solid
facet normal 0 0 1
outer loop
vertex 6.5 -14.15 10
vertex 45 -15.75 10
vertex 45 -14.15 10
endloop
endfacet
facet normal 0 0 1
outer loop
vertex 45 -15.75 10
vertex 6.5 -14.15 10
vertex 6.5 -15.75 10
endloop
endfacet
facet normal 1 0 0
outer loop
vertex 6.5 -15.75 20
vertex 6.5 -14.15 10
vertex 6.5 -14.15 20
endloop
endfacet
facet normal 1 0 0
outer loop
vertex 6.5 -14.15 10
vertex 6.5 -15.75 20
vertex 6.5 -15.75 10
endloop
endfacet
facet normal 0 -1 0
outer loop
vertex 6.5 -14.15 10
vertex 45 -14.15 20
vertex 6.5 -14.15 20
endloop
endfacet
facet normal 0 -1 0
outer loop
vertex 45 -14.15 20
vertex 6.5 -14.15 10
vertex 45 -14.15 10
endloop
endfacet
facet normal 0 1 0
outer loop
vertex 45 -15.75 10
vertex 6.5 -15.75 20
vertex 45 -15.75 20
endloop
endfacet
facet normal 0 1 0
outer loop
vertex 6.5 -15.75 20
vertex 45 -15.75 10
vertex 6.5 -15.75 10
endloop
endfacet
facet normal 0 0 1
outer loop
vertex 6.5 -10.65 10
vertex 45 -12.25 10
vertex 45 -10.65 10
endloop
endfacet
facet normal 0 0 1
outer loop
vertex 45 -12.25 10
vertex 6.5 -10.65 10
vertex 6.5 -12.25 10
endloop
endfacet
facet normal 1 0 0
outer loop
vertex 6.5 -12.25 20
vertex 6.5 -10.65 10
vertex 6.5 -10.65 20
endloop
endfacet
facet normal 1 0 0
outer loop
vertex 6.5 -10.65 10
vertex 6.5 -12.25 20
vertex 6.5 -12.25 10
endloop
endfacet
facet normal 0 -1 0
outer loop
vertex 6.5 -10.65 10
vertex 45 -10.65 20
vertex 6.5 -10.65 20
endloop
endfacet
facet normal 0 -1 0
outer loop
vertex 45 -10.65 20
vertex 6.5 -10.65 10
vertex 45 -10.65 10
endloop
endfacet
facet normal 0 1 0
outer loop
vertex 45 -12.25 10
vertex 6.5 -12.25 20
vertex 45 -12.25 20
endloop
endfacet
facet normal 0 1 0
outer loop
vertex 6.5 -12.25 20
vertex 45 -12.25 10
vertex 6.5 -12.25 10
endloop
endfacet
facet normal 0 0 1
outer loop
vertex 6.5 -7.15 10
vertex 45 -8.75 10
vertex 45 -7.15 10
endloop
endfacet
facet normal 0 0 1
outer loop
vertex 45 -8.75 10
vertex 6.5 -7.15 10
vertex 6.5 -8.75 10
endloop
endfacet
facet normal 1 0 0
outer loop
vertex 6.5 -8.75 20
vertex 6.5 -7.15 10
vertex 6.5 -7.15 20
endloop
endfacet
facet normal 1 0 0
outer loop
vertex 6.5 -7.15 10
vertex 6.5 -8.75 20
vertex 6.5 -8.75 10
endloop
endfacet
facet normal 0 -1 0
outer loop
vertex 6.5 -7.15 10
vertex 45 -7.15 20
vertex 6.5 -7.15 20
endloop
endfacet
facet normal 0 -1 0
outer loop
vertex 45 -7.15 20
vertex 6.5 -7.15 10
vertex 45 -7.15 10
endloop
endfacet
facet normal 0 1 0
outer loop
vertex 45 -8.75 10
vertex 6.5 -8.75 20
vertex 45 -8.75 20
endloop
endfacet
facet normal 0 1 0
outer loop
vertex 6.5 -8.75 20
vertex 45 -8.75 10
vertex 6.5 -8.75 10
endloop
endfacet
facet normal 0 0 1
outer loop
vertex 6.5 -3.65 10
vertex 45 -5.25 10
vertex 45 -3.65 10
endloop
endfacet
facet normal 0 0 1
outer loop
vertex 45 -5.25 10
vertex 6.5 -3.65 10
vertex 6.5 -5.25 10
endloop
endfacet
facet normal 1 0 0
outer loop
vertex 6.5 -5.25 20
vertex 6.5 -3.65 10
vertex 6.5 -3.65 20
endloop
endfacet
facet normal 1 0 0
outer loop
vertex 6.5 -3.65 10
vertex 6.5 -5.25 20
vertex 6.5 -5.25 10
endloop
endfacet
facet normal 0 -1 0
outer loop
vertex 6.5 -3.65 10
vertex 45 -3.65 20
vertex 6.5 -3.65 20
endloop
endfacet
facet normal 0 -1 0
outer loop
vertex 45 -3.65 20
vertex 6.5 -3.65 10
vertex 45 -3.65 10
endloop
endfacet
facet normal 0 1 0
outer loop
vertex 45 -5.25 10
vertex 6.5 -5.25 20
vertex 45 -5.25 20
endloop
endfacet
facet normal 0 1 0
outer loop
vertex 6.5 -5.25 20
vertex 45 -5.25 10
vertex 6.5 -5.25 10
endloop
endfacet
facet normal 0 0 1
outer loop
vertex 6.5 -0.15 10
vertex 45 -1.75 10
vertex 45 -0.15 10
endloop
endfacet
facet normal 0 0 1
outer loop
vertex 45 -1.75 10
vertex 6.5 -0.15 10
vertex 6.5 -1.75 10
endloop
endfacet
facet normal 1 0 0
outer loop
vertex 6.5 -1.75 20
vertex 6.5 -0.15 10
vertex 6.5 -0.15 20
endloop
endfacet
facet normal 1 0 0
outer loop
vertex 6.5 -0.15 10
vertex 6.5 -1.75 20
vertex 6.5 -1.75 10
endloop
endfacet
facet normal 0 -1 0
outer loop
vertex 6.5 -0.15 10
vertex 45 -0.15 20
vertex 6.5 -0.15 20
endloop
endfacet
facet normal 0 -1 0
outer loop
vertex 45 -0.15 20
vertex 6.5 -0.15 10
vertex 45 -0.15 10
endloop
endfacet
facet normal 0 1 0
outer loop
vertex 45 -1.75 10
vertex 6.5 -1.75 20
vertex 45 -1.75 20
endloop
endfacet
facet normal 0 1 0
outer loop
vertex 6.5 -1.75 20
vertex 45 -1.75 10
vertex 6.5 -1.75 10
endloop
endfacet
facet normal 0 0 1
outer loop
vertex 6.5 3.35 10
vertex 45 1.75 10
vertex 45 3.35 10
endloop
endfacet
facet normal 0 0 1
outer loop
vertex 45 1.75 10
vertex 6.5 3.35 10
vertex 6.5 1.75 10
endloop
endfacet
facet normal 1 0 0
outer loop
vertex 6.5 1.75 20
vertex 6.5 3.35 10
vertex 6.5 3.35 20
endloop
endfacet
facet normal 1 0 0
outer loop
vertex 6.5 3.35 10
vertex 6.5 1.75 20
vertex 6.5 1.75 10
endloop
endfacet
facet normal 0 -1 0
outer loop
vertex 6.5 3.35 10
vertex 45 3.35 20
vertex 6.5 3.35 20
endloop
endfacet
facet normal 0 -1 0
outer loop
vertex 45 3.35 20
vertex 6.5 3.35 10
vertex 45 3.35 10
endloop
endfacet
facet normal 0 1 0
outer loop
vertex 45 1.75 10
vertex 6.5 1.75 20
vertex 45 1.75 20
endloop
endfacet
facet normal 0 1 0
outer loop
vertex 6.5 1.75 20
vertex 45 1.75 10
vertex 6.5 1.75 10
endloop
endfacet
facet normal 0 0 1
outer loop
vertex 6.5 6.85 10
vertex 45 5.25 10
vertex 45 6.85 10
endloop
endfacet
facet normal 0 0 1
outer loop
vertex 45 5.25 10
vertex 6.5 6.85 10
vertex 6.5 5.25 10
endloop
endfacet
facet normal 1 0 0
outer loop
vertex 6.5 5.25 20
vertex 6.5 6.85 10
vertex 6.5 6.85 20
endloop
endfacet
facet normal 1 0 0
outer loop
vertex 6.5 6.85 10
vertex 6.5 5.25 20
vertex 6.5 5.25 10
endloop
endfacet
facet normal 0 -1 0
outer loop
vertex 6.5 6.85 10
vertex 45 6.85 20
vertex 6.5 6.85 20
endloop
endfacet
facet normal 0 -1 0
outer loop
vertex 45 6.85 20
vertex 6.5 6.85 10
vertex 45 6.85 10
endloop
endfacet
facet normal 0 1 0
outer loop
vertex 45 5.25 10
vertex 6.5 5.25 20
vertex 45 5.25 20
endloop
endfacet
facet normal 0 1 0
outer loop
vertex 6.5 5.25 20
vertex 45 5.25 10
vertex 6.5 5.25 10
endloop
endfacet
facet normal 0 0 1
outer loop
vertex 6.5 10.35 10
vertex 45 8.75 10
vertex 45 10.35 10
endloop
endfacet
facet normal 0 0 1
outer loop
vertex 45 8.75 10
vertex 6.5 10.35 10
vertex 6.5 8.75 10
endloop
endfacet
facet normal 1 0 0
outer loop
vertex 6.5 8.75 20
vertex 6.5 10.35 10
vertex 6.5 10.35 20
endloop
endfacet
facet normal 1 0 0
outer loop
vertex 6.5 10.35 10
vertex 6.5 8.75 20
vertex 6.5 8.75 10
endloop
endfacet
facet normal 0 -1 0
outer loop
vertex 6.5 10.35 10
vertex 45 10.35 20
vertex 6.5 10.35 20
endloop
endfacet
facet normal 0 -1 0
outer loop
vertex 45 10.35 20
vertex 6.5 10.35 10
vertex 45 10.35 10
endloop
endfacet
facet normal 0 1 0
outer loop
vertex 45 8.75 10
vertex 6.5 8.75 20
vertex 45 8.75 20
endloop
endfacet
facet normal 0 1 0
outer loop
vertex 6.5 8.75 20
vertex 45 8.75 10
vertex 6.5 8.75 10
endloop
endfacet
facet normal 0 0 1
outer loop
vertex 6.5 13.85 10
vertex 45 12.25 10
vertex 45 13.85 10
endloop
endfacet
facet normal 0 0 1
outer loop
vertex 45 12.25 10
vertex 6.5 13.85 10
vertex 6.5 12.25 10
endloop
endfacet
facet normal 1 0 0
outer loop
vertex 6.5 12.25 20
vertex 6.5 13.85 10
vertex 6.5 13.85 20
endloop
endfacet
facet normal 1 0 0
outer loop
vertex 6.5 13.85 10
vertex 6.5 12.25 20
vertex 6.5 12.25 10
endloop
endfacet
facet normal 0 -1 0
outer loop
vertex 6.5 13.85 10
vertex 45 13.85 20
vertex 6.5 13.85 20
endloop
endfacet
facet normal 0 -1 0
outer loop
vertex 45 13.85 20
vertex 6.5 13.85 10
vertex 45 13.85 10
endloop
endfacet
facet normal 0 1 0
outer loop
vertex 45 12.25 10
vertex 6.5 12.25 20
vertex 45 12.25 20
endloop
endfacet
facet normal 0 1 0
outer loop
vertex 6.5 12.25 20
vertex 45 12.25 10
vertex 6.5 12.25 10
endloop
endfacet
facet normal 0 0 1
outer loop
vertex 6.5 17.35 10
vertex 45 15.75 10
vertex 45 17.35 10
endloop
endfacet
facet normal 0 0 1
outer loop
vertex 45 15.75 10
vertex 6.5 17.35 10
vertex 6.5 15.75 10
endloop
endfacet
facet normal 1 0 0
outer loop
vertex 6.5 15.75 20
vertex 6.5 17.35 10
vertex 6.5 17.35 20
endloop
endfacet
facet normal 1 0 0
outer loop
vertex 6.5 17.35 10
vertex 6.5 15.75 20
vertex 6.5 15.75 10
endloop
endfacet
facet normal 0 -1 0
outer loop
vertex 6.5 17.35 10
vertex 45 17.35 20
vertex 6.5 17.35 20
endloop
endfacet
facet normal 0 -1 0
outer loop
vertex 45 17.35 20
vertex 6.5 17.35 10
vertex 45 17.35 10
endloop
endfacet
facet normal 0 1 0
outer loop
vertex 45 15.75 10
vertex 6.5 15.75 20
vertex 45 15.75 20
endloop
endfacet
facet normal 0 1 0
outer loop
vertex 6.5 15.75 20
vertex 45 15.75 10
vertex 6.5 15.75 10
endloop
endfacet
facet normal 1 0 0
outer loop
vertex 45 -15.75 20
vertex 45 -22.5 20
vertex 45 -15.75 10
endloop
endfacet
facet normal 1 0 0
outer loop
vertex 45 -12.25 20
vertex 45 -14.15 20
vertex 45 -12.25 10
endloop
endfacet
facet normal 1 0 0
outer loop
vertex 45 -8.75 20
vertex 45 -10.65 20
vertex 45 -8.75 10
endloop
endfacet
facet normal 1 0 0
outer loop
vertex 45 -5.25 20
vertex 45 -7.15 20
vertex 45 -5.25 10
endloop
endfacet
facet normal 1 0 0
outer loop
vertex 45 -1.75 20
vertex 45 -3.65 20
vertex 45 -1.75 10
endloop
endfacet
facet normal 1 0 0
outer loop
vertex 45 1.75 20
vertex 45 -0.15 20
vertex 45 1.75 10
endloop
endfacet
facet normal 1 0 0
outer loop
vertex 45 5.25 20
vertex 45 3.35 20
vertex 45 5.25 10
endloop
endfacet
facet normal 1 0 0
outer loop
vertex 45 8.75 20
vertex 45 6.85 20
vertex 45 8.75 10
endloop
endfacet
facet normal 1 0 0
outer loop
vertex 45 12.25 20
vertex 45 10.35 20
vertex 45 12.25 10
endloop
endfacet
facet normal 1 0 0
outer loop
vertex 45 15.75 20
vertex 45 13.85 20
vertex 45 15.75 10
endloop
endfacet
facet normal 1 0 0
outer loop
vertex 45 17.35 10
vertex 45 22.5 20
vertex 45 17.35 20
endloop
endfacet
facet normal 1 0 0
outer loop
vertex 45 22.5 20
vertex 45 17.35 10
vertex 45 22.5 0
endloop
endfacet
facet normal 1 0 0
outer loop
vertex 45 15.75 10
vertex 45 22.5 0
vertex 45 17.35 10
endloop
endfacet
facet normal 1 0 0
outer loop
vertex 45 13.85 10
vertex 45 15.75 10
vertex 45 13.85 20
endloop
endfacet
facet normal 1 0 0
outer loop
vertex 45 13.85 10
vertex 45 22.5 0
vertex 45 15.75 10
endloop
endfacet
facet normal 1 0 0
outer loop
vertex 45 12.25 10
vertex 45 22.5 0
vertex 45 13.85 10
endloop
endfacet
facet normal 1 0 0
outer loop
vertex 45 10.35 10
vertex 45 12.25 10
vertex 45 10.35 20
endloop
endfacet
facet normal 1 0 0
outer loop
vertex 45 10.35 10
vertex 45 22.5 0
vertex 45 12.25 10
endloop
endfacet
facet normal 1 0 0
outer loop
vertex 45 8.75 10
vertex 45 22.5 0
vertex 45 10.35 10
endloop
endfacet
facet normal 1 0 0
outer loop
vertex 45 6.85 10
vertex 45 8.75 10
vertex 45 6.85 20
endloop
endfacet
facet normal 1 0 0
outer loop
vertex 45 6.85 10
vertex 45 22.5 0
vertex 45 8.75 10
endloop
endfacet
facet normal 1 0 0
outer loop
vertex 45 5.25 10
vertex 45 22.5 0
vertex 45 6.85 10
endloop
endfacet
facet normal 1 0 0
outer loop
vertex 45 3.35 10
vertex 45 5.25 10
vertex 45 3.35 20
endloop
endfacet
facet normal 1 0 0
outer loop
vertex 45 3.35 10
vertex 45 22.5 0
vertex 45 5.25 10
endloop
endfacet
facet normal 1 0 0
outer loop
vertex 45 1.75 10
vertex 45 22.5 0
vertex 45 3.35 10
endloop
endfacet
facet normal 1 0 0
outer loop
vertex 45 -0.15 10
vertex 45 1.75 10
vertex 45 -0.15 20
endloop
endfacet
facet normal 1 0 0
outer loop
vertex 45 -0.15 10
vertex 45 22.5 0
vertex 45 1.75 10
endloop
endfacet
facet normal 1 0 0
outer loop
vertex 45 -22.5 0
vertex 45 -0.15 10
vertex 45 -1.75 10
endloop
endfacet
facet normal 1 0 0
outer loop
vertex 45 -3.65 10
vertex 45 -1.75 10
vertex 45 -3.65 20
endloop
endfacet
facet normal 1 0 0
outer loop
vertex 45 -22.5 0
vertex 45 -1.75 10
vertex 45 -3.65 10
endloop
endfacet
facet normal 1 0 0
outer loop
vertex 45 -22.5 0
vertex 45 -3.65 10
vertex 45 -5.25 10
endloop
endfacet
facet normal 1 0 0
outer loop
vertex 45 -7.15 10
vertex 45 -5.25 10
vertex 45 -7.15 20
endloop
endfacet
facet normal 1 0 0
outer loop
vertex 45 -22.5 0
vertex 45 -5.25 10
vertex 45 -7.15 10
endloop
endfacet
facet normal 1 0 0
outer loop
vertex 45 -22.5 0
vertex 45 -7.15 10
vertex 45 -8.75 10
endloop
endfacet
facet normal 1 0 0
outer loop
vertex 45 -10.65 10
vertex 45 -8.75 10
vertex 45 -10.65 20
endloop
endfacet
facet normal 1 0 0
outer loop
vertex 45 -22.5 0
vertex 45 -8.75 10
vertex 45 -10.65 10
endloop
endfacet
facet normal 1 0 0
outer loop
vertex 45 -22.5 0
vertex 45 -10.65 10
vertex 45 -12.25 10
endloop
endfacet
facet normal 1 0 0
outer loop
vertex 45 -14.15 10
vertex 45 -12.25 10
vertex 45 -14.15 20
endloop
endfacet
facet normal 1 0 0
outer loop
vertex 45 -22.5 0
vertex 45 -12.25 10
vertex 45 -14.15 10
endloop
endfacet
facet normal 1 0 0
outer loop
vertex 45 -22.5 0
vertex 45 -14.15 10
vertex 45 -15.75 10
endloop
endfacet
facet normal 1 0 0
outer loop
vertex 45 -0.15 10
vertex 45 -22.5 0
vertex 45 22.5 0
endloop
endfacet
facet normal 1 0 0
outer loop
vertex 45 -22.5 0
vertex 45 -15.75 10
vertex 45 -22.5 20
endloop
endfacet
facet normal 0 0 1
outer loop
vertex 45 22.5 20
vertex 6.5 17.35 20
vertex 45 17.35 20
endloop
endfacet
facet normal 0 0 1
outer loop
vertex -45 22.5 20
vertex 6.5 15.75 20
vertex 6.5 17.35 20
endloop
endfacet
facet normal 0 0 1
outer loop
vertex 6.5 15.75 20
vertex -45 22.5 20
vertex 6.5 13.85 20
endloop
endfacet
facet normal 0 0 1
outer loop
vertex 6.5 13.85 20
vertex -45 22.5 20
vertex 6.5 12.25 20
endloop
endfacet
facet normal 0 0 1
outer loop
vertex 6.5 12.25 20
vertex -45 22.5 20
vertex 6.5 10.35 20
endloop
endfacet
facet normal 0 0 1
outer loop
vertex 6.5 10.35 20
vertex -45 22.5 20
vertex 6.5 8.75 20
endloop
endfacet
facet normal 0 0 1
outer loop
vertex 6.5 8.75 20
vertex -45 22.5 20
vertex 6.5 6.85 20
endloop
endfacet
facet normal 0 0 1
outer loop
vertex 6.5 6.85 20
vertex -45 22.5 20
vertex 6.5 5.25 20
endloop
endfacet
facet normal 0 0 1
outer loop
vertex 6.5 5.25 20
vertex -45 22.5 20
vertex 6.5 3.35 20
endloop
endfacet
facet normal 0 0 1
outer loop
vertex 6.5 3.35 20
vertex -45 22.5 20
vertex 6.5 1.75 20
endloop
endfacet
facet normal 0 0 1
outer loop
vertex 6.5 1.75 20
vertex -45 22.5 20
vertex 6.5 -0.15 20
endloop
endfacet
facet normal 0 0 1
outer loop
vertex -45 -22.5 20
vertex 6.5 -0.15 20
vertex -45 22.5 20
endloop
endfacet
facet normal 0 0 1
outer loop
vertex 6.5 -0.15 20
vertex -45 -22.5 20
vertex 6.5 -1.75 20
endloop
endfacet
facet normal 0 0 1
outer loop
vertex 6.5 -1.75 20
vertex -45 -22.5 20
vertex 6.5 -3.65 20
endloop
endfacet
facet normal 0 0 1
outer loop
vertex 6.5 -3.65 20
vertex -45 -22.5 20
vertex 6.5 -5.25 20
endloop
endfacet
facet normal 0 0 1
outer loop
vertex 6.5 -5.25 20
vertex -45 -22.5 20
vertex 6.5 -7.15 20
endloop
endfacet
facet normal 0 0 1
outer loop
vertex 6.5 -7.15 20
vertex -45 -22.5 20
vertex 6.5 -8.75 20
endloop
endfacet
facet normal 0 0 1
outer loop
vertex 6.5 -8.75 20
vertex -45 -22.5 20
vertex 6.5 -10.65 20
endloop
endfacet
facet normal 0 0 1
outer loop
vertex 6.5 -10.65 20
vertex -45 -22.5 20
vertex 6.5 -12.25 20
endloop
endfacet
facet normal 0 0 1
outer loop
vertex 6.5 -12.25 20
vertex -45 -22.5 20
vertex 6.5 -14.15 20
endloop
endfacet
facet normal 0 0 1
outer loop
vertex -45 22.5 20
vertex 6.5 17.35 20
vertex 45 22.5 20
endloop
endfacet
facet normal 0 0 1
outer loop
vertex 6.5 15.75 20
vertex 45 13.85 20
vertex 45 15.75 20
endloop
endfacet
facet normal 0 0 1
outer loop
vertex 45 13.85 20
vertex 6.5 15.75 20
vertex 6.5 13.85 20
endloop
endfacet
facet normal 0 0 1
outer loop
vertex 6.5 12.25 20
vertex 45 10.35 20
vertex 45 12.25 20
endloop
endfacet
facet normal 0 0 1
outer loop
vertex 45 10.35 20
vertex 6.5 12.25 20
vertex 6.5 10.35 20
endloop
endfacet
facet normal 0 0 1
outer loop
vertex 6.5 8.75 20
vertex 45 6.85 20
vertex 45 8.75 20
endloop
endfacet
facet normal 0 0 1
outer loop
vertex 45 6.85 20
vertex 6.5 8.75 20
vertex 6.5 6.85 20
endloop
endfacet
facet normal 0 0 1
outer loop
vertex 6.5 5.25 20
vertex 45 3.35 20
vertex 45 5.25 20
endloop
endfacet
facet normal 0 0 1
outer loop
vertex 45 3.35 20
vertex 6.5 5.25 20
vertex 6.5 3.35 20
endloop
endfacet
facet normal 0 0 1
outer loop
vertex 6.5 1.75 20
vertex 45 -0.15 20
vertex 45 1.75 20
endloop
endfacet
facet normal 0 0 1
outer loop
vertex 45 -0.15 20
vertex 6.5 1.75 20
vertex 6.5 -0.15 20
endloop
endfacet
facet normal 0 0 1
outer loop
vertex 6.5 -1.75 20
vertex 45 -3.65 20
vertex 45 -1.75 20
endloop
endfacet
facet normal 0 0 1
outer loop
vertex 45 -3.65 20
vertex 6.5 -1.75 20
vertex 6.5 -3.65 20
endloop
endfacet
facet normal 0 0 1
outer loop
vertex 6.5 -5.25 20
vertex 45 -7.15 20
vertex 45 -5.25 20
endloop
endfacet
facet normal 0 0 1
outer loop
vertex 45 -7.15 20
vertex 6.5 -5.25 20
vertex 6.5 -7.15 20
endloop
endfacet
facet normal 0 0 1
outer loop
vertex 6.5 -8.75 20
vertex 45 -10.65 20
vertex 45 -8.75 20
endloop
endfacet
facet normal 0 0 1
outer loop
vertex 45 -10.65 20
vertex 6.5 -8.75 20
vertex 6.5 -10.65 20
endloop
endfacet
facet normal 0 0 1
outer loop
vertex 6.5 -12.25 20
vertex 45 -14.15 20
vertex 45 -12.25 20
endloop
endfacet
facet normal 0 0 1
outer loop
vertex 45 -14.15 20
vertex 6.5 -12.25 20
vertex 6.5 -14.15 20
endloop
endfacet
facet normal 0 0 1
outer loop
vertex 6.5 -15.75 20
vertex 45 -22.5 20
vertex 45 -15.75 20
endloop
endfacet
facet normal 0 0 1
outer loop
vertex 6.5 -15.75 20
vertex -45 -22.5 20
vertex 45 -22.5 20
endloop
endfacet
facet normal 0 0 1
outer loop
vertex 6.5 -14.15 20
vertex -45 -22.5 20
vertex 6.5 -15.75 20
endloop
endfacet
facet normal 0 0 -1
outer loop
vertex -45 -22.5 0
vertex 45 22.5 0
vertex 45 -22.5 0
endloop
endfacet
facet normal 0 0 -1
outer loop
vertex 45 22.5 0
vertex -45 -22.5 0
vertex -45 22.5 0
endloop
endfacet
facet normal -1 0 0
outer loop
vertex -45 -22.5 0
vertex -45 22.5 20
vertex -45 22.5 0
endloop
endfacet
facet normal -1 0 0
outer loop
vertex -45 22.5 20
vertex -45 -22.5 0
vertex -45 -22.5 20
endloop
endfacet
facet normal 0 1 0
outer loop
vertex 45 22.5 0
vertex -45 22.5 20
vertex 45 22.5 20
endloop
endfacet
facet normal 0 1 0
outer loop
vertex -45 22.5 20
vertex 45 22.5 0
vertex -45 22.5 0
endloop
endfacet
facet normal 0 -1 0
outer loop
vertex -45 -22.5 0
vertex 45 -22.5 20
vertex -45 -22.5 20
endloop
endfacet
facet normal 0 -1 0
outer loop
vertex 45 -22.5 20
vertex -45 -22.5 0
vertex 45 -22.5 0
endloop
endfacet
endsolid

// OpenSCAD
// Slide drying rack - holds 10 microscope slides standing on their long edge
// Print orientation: base block on the bed (z = 0), slots open upward.

// ---------------- Parameters ----------------
n_slots      = 10;    // number of slide slots
slide_len    = 75;    // slide length along X (mm)
slide_wid    = 25;    // slide width along Y (mm)
slide_thk    = 1;     // slide thickness along Z (mm)

base_len     = 90;    // base block length along X (mm)
base_wid     = 45;    // base block width along Y (mm)
base_ht      = 20;    // base block height along Z (mm)

slot_len     = 77;    // slot length along X (mm)
slot_wid     = 1.6;   // slot width along Y (mm)
slot_depth   = 10;    // slot depth from top face (mm)
slot_pitch   = 3.5;   // centre-to-centre slot spacing along Y (mm)

eps          = 0.5;   // overcut past faces to avoid coplanar surfaces (mm)

$fn = 64;

// ---------------- Derived ----------------
slot_x0 = -(slot_len - base_len) / 2;              // slot start X (centred on block)
slot_y0 = -(n_slots - 1) * slot_pitch / 2;          // first slot centre Y (group centred)

// ---------------- Model ----------------
difference() {
    // Base block
    translate([-base_len / 2, -base_wid / 2, 0])
        cube([base_len, base_wid, base_ht]);

    // Parallel slots, open at the top
    for (i = [0 : n_slots - 1])
        translate([slot_x0, slot_y0 + i * slot_pitch, base_ht - slot_depth])
            cube([slot_len, slot_wid, slot_depth + eps]);
}
